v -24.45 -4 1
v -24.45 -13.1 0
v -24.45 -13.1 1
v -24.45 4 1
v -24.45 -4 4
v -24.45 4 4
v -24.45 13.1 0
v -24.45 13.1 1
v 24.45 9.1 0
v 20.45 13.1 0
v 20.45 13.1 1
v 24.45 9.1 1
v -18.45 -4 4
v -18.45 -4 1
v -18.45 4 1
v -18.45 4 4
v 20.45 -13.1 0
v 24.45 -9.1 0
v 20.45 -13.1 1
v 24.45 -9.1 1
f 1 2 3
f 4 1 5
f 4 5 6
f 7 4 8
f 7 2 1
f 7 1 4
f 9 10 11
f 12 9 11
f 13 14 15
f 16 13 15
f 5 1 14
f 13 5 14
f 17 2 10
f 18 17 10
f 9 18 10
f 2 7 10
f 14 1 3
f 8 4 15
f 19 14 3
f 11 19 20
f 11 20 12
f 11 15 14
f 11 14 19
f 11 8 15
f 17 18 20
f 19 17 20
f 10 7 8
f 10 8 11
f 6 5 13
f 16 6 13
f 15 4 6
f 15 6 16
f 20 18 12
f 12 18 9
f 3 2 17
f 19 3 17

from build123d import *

# Parameters (mm, degrees)
F0_W     = 48.9
F0_H     = 26.2
F1_DEPTH = 1
F2_SIZE  = 4
F3_W     = 6
F3_H     = 8
F4_DEPTH = 3


with BuildPart() as f1:
    # F0 (on Top) → F1 (new body)
    with BuildSketch(Plane.XY):
        Rectangle(F0_W, F0_H)
    extrude(amount=F1_DEPTH)

    # F2
    f2_edges = [f1.edges().sort_by_distance(p)[0] for p in [
        (24.45, 13.1, 0.5),
        (24.45, -13.1, 0.5),
    ]]
    chamfer(f2_edges, length=F2_SIZE)

    # F3 (on face) → F4 (join)
    with BuildSketch(Plane.XY.offset(1)):
        with Locations((-21.45, 0)):
            Rectangle(F3_W, F3_H)
    extrude(amount=F4_DEPTH)


solid = f1.part
